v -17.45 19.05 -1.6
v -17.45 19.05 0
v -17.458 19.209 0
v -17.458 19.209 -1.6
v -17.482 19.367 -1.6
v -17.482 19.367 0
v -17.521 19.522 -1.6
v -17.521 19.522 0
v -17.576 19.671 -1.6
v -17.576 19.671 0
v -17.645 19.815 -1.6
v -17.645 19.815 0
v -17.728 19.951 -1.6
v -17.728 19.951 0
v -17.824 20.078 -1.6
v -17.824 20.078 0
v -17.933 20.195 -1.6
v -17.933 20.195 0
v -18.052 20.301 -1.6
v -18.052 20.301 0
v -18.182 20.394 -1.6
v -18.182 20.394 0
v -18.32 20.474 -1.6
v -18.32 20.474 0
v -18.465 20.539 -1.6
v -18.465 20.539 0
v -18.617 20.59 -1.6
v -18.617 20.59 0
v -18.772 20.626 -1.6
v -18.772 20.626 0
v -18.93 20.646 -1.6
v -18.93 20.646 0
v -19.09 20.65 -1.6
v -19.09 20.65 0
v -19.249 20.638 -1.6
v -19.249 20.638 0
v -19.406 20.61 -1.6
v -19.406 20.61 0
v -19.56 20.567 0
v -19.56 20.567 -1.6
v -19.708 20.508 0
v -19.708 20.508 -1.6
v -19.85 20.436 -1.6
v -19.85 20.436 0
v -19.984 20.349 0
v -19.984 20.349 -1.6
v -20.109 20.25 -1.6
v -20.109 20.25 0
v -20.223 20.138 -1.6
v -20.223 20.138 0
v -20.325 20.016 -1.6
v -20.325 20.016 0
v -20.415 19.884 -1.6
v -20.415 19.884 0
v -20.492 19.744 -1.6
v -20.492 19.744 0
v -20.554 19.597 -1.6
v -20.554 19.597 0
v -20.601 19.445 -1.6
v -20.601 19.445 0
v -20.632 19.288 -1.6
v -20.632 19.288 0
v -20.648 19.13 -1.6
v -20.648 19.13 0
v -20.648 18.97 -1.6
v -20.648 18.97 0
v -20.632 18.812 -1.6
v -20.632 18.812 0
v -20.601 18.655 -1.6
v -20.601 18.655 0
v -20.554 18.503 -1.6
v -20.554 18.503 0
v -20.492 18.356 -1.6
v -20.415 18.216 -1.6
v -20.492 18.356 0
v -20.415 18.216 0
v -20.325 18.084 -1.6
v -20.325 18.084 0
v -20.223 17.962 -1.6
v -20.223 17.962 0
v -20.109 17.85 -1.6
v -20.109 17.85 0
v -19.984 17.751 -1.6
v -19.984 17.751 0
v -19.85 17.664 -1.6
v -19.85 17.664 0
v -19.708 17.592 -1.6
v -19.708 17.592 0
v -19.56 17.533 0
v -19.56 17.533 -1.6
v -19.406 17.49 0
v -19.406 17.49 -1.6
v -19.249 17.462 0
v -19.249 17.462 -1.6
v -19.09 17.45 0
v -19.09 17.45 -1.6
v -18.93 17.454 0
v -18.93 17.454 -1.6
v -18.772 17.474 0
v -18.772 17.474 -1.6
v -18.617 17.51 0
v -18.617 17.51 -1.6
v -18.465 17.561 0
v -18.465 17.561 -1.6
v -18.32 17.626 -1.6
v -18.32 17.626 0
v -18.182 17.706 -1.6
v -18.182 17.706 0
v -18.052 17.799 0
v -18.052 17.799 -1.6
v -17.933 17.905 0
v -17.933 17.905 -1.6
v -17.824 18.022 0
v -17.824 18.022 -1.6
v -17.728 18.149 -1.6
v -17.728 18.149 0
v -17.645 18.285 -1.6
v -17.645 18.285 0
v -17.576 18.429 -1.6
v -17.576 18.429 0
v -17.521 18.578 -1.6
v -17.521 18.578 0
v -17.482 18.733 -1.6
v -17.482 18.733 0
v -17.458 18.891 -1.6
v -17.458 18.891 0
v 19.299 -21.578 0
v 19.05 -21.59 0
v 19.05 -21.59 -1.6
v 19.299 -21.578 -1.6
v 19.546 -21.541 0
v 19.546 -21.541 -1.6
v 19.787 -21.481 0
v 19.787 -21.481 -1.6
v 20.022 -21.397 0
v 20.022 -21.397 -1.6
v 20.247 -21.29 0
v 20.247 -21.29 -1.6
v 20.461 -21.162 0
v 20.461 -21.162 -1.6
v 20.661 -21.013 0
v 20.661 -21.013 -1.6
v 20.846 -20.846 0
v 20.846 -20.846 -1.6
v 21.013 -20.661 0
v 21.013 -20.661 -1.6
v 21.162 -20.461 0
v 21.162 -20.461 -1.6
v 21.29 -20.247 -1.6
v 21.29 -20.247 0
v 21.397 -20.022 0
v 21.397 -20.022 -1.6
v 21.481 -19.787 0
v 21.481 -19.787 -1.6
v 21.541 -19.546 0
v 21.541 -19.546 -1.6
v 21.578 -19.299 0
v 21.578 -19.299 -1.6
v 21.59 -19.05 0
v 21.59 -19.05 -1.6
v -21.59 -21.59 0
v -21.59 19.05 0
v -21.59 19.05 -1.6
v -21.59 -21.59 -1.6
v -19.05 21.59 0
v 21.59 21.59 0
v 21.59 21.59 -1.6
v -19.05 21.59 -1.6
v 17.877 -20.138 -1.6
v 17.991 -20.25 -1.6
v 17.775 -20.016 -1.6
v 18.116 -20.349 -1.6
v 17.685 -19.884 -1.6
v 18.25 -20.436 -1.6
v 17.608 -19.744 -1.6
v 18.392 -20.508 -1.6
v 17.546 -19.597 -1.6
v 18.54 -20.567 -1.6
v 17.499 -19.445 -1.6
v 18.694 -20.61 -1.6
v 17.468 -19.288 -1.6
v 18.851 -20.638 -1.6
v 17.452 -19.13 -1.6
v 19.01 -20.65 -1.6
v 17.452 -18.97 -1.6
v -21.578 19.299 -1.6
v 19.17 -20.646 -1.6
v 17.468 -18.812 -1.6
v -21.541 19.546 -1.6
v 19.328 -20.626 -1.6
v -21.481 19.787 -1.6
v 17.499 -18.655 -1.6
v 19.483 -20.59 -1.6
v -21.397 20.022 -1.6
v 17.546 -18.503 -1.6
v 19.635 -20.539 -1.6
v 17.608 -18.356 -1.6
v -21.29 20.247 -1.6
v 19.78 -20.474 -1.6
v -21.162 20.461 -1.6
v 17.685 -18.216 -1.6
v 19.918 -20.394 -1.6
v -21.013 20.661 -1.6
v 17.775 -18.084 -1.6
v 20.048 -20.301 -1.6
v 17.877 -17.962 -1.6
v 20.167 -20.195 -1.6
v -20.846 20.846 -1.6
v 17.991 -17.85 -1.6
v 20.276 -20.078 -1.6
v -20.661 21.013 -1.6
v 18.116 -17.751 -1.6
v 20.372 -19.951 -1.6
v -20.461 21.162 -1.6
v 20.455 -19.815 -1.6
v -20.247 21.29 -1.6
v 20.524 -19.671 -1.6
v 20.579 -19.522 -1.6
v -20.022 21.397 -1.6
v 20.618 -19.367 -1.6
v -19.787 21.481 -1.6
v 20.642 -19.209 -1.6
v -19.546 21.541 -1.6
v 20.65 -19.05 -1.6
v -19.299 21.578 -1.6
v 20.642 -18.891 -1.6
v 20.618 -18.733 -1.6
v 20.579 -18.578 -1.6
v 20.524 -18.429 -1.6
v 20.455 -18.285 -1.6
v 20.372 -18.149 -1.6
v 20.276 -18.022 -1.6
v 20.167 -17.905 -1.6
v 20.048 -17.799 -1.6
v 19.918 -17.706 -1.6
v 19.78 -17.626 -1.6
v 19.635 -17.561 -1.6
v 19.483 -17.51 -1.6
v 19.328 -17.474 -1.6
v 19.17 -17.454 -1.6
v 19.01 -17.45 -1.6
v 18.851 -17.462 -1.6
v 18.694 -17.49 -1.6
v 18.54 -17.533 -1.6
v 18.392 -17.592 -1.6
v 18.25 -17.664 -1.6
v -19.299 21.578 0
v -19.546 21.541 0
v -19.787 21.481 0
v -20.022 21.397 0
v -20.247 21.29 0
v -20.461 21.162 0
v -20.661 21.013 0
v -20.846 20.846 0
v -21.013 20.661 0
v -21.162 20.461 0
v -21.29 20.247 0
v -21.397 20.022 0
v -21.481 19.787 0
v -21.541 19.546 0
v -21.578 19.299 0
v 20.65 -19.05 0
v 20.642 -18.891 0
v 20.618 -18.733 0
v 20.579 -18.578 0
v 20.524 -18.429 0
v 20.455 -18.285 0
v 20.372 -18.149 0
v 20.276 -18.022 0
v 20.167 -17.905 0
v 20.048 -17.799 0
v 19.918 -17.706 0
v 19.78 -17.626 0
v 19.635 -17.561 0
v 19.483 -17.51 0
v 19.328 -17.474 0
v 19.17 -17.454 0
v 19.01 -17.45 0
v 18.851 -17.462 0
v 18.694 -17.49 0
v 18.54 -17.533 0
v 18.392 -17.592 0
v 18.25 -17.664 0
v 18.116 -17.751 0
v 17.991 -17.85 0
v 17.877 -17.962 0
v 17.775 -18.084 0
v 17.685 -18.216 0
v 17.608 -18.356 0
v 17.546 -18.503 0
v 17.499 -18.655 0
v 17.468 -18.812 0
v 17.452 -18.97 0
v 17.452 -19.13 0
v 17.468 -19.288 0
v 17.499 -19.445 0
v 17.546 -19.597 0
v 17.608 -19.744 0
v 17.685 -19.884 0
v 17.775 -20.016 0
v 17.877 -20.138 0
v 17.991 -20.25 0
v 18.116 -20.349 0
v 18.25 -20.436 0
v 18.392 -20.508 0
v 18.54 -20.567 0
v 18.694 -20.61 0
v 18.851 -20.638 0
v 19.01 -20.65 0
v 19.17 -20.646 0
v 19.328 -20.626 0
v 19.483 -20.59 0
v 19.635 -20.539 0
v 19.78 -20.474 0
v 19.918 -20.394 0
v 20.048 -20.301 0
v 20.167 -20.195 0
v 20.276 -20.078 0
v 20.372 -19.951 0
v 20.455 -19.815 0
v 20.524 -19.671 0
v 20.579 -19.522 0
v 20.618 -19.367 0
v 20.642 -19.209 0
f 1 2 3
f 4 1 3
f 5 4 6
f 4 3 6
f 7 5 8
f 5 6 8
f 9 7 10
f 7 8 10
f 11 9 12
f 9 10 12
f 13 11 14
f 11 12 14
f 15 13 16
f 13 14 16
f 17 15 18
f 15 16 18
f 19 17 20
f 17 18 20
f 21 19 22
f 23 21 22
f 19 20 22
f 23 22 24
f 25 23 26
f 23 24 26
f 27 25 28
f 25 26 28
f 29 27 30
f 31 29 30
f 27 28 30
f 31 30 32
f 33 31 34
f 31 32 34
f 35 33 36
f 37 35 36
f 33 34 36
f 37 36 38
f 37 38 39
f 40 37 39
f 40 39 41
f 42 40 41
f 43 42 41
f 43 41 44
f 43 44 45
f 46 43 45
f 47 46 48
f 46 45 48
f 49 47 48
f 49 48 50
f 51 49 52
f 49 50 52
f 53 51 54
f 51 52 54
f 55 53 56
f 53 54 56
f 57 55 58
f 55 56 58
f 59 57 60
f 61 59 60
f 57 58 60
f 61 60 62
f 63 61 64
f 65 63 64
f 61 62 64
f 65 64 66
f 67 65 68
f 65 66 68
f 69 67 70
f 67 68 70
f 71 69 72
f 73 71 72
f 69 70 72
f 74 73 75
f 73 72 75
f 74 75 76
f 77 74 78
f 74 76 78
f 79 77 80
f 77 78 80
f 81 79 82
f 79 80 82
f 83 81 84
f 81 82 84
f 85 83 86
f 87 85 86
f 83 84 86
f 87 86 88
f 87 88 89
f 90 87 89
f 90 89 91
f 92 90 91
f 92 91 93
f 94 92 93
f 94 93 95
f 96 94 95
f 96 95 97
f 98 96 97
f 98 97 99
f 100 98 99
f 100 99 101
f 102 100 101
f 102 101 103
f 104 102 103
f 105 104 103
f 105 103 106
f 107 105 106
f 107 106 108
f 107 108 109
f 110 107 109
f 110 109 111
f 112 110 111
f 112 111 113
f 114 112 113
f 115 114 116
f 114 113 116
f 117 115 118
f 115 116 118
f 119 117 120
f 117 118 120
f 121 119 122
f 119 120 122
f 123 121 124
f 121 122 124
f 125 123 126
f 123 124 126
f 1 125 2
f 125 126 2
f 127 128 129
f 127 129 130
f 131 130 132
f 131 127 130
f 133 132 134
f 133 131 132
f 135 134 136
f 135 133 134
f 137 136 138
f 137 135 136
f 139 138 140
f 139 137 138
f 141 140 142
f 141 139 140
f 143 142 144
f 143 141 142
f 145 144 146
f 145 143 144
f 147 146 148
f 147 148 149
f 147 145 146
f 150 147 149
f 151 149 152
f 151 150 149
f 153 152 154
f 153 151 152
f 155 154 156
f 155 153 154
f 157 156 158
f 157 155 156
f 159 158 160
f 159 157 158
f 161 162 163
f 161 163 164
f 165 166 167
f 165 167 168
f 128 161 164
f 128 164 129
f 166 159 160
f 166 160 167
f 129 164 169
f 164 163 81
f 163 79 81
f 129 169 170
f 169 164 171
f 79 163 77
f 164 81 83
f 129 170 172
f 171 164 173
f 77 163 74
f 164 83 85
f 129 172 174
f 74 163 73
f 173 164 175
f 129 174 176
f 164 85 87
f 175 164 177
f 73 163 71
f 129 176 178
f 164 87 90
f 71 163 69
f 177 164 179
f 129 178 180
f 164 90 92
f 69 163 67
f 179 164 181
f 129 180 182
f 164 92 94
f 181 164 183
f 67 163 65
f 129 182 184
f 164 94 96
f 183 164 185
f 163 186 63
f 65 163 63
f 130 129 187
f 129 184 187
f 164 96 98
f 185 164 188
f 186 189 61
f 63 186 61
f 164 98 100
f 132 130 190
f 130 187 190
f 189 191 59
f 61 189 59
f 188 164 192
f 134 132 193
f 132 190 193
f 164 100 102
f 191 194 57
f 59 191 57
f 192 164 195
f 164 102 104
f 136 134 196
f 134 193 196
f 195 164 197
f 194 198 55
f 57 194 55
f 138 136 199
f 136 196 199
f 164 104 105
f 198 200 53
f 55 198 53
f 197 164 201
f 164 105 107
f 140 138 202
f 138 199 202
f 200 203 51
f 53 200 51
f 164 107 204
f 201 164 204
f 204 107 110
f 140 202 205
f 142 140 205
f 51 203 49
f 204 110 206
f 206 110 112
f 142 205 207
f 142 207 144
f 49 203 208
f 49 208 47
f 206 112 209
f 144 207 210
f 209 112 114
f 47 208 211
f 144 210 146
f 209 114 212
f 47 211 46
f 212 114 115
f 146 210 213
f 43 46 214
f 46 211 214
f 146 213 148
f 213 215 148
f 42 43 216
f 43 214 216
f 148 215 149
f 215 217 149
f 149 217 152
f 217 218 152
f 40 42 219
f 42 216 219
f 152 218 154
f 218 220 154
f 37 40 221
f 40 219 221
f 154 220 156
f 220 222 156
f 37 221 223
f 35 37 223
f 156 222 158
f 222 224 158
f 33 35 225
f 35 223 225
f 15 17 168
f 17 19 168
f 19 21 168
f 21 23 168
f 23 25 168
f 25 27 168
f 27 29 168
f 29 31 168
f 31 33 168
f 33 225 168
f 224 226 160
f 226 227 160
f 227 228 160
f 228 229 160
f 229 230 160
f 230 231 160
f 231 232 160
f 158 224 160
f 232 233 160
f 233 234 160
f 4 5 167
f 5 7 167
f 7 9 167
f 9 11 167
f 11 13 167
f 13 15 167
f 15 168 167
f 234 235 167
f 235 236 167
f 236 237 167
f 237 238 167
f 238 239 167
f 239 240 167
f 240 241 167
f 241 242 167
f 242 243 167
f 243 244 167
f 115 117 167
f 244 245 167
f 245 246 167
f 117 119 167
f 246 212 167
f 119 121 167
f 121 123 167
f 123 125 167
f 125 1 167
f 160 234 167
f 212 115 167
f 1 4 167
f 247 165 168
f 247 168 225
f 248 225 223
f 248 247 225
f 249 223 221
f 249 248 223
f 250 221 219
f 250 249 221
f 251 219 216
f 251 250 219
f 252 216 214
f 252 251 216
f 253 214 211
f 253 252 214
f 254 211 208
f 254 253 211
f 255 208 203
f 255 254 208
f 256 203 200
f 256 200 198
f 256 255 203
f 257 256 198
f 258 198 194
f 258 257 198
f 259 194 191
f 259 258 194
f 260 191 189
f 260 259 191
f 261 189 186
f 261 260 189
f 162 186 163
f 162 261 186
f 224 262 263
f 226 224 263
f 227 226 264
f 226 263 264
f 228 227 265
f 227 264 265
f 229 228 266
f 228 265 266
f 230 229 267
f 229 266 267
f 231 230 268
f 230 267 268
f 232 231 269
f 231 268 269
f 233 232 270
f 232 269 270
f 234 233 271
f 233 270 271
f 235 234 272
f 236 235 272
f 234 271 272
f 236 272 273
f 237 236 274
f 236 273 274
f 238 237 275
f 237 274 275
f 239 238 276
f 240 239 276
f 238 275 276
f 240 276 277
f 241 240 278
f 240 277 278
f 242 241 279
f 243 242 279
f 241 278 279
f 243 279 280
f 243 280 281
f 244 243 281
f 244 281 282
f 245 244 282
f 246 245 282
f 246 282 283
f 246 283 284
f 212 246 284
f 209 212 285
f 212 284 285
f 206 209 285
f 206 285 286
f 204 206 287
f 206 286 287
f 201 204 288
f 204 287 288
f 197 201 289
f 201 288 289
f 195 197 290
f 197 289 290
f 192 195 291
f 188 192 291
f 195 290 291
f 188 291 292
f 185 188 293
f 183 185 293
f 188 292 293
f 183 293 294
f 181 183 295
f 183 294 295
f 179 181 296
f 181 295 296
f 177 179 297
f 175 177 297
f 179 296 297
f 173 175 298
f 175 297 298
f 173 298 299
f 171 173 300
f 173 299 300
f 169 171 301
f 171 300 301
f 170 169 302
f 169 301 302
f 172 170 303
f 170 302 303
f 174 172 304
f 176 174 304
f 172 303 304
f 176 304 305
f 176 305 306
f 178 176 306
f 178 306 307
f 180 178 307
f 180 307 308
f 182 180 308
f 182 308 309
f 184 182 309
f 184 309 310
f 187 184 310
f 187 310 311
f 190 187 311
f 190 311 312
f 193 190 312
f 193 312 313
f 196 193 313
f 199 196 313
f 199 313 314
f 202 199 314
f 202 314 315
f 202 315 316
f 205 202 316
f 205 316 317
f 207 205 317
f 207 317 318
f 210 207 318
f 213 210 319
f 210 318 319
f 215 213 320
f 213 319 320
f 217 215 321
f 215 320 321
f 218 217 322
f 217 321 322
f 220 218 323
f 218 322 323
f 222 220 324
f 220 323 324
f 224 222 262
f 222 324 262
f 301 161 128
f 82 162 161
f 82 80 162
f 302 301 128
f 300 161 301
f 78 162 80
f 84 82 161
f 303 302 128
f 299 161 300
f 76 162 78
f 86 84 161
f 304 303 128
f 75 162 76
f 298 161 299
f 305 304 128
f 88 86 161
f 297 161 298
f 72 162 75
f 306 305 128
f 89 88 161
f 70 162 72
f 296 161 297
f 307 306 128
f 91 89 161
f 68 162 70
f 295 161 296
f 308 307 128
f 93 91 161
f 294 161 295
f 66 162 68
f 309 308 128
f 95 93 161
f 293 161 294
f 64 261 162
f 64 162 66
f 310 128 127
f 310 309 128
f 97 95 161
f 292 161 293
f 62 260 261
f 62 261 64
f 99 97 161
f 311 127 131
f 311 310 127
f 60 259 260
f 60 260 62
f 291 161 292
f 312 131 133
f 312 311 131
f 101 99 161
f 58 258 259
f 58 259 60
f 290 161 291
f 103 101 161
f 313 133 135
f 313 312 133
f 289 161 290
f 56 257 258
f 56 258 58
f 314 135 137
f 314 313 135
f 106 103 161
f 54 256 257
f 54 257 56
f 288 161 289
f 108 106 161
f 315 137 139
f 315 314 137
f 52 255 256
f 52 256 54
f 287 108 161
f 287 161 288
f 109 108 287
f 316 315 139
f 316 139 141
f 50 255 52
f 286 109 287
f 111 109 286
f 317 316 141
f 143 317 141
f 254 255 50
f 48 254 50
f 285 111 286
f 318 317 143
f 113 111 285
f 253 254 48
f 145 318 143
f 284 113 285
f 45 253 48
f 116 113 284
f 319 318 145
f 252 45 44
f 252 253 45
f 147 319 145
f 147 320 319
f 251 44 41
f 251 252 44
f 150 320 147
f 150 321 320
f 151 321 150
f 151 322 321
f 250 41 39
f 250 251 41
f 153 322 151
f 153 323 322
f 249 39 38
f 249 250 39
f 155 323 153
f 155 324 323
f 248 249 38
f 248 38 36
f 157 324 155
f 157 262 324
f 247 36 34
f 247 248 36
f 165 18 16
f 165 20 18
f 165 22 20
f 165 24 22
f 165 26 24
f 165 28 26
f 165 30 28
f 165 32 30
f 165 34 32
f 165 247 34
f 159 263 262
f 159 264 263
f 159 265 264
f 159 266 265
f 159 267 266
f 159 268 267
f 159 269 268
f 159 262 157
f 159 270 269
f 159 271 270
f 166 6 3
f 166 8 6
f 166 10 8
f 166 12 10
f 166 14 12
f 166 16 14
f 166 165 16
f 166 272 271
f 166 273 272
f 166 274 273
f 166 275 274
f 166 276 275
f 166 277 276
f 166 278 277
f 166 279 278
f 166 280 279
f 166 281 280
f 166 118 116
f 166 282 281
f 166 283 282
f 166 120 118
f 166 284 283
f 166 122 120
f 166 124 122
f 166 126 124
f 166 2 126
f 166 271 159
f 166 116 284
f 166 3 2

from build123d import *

# Parameters (mm, degrees)
F0_R     = 1.6
F1_DEPTH = 1.6


with BuildPart() as f1:
    # F0 (on Top) → F1 (new body)
    with BuildSketch(Plane.XY):
        with BuildLine():
            Line((21.59, 21.59), (-19.05, 21.59))
            ThreePointArc((-19.05, 21.59), (-20.846051, 20.846051), (-21.59, 19.05))
            Line((-21.59, 19.05), (-21.59, -21.59))
            Line((-21.59, -21.59), (19.05, -21.59))
            ThreePointArc((19.05, -21.59), (20.846051, -20.846051), (21.59, -19.05))
            Line((21.59, -19.05), (21.59, 21.59))
        make_face()
        with Locations((19.05, -19.05)):
            Circle(F0_R, mode=Mode.SUBTRACT)
        with Locations((-19.05, 19.05)):
            Circle(F0_R, mode=Mode.SUBTRACT)
    extrude(amount=-F1_DEPTH)


solid = f1.part
